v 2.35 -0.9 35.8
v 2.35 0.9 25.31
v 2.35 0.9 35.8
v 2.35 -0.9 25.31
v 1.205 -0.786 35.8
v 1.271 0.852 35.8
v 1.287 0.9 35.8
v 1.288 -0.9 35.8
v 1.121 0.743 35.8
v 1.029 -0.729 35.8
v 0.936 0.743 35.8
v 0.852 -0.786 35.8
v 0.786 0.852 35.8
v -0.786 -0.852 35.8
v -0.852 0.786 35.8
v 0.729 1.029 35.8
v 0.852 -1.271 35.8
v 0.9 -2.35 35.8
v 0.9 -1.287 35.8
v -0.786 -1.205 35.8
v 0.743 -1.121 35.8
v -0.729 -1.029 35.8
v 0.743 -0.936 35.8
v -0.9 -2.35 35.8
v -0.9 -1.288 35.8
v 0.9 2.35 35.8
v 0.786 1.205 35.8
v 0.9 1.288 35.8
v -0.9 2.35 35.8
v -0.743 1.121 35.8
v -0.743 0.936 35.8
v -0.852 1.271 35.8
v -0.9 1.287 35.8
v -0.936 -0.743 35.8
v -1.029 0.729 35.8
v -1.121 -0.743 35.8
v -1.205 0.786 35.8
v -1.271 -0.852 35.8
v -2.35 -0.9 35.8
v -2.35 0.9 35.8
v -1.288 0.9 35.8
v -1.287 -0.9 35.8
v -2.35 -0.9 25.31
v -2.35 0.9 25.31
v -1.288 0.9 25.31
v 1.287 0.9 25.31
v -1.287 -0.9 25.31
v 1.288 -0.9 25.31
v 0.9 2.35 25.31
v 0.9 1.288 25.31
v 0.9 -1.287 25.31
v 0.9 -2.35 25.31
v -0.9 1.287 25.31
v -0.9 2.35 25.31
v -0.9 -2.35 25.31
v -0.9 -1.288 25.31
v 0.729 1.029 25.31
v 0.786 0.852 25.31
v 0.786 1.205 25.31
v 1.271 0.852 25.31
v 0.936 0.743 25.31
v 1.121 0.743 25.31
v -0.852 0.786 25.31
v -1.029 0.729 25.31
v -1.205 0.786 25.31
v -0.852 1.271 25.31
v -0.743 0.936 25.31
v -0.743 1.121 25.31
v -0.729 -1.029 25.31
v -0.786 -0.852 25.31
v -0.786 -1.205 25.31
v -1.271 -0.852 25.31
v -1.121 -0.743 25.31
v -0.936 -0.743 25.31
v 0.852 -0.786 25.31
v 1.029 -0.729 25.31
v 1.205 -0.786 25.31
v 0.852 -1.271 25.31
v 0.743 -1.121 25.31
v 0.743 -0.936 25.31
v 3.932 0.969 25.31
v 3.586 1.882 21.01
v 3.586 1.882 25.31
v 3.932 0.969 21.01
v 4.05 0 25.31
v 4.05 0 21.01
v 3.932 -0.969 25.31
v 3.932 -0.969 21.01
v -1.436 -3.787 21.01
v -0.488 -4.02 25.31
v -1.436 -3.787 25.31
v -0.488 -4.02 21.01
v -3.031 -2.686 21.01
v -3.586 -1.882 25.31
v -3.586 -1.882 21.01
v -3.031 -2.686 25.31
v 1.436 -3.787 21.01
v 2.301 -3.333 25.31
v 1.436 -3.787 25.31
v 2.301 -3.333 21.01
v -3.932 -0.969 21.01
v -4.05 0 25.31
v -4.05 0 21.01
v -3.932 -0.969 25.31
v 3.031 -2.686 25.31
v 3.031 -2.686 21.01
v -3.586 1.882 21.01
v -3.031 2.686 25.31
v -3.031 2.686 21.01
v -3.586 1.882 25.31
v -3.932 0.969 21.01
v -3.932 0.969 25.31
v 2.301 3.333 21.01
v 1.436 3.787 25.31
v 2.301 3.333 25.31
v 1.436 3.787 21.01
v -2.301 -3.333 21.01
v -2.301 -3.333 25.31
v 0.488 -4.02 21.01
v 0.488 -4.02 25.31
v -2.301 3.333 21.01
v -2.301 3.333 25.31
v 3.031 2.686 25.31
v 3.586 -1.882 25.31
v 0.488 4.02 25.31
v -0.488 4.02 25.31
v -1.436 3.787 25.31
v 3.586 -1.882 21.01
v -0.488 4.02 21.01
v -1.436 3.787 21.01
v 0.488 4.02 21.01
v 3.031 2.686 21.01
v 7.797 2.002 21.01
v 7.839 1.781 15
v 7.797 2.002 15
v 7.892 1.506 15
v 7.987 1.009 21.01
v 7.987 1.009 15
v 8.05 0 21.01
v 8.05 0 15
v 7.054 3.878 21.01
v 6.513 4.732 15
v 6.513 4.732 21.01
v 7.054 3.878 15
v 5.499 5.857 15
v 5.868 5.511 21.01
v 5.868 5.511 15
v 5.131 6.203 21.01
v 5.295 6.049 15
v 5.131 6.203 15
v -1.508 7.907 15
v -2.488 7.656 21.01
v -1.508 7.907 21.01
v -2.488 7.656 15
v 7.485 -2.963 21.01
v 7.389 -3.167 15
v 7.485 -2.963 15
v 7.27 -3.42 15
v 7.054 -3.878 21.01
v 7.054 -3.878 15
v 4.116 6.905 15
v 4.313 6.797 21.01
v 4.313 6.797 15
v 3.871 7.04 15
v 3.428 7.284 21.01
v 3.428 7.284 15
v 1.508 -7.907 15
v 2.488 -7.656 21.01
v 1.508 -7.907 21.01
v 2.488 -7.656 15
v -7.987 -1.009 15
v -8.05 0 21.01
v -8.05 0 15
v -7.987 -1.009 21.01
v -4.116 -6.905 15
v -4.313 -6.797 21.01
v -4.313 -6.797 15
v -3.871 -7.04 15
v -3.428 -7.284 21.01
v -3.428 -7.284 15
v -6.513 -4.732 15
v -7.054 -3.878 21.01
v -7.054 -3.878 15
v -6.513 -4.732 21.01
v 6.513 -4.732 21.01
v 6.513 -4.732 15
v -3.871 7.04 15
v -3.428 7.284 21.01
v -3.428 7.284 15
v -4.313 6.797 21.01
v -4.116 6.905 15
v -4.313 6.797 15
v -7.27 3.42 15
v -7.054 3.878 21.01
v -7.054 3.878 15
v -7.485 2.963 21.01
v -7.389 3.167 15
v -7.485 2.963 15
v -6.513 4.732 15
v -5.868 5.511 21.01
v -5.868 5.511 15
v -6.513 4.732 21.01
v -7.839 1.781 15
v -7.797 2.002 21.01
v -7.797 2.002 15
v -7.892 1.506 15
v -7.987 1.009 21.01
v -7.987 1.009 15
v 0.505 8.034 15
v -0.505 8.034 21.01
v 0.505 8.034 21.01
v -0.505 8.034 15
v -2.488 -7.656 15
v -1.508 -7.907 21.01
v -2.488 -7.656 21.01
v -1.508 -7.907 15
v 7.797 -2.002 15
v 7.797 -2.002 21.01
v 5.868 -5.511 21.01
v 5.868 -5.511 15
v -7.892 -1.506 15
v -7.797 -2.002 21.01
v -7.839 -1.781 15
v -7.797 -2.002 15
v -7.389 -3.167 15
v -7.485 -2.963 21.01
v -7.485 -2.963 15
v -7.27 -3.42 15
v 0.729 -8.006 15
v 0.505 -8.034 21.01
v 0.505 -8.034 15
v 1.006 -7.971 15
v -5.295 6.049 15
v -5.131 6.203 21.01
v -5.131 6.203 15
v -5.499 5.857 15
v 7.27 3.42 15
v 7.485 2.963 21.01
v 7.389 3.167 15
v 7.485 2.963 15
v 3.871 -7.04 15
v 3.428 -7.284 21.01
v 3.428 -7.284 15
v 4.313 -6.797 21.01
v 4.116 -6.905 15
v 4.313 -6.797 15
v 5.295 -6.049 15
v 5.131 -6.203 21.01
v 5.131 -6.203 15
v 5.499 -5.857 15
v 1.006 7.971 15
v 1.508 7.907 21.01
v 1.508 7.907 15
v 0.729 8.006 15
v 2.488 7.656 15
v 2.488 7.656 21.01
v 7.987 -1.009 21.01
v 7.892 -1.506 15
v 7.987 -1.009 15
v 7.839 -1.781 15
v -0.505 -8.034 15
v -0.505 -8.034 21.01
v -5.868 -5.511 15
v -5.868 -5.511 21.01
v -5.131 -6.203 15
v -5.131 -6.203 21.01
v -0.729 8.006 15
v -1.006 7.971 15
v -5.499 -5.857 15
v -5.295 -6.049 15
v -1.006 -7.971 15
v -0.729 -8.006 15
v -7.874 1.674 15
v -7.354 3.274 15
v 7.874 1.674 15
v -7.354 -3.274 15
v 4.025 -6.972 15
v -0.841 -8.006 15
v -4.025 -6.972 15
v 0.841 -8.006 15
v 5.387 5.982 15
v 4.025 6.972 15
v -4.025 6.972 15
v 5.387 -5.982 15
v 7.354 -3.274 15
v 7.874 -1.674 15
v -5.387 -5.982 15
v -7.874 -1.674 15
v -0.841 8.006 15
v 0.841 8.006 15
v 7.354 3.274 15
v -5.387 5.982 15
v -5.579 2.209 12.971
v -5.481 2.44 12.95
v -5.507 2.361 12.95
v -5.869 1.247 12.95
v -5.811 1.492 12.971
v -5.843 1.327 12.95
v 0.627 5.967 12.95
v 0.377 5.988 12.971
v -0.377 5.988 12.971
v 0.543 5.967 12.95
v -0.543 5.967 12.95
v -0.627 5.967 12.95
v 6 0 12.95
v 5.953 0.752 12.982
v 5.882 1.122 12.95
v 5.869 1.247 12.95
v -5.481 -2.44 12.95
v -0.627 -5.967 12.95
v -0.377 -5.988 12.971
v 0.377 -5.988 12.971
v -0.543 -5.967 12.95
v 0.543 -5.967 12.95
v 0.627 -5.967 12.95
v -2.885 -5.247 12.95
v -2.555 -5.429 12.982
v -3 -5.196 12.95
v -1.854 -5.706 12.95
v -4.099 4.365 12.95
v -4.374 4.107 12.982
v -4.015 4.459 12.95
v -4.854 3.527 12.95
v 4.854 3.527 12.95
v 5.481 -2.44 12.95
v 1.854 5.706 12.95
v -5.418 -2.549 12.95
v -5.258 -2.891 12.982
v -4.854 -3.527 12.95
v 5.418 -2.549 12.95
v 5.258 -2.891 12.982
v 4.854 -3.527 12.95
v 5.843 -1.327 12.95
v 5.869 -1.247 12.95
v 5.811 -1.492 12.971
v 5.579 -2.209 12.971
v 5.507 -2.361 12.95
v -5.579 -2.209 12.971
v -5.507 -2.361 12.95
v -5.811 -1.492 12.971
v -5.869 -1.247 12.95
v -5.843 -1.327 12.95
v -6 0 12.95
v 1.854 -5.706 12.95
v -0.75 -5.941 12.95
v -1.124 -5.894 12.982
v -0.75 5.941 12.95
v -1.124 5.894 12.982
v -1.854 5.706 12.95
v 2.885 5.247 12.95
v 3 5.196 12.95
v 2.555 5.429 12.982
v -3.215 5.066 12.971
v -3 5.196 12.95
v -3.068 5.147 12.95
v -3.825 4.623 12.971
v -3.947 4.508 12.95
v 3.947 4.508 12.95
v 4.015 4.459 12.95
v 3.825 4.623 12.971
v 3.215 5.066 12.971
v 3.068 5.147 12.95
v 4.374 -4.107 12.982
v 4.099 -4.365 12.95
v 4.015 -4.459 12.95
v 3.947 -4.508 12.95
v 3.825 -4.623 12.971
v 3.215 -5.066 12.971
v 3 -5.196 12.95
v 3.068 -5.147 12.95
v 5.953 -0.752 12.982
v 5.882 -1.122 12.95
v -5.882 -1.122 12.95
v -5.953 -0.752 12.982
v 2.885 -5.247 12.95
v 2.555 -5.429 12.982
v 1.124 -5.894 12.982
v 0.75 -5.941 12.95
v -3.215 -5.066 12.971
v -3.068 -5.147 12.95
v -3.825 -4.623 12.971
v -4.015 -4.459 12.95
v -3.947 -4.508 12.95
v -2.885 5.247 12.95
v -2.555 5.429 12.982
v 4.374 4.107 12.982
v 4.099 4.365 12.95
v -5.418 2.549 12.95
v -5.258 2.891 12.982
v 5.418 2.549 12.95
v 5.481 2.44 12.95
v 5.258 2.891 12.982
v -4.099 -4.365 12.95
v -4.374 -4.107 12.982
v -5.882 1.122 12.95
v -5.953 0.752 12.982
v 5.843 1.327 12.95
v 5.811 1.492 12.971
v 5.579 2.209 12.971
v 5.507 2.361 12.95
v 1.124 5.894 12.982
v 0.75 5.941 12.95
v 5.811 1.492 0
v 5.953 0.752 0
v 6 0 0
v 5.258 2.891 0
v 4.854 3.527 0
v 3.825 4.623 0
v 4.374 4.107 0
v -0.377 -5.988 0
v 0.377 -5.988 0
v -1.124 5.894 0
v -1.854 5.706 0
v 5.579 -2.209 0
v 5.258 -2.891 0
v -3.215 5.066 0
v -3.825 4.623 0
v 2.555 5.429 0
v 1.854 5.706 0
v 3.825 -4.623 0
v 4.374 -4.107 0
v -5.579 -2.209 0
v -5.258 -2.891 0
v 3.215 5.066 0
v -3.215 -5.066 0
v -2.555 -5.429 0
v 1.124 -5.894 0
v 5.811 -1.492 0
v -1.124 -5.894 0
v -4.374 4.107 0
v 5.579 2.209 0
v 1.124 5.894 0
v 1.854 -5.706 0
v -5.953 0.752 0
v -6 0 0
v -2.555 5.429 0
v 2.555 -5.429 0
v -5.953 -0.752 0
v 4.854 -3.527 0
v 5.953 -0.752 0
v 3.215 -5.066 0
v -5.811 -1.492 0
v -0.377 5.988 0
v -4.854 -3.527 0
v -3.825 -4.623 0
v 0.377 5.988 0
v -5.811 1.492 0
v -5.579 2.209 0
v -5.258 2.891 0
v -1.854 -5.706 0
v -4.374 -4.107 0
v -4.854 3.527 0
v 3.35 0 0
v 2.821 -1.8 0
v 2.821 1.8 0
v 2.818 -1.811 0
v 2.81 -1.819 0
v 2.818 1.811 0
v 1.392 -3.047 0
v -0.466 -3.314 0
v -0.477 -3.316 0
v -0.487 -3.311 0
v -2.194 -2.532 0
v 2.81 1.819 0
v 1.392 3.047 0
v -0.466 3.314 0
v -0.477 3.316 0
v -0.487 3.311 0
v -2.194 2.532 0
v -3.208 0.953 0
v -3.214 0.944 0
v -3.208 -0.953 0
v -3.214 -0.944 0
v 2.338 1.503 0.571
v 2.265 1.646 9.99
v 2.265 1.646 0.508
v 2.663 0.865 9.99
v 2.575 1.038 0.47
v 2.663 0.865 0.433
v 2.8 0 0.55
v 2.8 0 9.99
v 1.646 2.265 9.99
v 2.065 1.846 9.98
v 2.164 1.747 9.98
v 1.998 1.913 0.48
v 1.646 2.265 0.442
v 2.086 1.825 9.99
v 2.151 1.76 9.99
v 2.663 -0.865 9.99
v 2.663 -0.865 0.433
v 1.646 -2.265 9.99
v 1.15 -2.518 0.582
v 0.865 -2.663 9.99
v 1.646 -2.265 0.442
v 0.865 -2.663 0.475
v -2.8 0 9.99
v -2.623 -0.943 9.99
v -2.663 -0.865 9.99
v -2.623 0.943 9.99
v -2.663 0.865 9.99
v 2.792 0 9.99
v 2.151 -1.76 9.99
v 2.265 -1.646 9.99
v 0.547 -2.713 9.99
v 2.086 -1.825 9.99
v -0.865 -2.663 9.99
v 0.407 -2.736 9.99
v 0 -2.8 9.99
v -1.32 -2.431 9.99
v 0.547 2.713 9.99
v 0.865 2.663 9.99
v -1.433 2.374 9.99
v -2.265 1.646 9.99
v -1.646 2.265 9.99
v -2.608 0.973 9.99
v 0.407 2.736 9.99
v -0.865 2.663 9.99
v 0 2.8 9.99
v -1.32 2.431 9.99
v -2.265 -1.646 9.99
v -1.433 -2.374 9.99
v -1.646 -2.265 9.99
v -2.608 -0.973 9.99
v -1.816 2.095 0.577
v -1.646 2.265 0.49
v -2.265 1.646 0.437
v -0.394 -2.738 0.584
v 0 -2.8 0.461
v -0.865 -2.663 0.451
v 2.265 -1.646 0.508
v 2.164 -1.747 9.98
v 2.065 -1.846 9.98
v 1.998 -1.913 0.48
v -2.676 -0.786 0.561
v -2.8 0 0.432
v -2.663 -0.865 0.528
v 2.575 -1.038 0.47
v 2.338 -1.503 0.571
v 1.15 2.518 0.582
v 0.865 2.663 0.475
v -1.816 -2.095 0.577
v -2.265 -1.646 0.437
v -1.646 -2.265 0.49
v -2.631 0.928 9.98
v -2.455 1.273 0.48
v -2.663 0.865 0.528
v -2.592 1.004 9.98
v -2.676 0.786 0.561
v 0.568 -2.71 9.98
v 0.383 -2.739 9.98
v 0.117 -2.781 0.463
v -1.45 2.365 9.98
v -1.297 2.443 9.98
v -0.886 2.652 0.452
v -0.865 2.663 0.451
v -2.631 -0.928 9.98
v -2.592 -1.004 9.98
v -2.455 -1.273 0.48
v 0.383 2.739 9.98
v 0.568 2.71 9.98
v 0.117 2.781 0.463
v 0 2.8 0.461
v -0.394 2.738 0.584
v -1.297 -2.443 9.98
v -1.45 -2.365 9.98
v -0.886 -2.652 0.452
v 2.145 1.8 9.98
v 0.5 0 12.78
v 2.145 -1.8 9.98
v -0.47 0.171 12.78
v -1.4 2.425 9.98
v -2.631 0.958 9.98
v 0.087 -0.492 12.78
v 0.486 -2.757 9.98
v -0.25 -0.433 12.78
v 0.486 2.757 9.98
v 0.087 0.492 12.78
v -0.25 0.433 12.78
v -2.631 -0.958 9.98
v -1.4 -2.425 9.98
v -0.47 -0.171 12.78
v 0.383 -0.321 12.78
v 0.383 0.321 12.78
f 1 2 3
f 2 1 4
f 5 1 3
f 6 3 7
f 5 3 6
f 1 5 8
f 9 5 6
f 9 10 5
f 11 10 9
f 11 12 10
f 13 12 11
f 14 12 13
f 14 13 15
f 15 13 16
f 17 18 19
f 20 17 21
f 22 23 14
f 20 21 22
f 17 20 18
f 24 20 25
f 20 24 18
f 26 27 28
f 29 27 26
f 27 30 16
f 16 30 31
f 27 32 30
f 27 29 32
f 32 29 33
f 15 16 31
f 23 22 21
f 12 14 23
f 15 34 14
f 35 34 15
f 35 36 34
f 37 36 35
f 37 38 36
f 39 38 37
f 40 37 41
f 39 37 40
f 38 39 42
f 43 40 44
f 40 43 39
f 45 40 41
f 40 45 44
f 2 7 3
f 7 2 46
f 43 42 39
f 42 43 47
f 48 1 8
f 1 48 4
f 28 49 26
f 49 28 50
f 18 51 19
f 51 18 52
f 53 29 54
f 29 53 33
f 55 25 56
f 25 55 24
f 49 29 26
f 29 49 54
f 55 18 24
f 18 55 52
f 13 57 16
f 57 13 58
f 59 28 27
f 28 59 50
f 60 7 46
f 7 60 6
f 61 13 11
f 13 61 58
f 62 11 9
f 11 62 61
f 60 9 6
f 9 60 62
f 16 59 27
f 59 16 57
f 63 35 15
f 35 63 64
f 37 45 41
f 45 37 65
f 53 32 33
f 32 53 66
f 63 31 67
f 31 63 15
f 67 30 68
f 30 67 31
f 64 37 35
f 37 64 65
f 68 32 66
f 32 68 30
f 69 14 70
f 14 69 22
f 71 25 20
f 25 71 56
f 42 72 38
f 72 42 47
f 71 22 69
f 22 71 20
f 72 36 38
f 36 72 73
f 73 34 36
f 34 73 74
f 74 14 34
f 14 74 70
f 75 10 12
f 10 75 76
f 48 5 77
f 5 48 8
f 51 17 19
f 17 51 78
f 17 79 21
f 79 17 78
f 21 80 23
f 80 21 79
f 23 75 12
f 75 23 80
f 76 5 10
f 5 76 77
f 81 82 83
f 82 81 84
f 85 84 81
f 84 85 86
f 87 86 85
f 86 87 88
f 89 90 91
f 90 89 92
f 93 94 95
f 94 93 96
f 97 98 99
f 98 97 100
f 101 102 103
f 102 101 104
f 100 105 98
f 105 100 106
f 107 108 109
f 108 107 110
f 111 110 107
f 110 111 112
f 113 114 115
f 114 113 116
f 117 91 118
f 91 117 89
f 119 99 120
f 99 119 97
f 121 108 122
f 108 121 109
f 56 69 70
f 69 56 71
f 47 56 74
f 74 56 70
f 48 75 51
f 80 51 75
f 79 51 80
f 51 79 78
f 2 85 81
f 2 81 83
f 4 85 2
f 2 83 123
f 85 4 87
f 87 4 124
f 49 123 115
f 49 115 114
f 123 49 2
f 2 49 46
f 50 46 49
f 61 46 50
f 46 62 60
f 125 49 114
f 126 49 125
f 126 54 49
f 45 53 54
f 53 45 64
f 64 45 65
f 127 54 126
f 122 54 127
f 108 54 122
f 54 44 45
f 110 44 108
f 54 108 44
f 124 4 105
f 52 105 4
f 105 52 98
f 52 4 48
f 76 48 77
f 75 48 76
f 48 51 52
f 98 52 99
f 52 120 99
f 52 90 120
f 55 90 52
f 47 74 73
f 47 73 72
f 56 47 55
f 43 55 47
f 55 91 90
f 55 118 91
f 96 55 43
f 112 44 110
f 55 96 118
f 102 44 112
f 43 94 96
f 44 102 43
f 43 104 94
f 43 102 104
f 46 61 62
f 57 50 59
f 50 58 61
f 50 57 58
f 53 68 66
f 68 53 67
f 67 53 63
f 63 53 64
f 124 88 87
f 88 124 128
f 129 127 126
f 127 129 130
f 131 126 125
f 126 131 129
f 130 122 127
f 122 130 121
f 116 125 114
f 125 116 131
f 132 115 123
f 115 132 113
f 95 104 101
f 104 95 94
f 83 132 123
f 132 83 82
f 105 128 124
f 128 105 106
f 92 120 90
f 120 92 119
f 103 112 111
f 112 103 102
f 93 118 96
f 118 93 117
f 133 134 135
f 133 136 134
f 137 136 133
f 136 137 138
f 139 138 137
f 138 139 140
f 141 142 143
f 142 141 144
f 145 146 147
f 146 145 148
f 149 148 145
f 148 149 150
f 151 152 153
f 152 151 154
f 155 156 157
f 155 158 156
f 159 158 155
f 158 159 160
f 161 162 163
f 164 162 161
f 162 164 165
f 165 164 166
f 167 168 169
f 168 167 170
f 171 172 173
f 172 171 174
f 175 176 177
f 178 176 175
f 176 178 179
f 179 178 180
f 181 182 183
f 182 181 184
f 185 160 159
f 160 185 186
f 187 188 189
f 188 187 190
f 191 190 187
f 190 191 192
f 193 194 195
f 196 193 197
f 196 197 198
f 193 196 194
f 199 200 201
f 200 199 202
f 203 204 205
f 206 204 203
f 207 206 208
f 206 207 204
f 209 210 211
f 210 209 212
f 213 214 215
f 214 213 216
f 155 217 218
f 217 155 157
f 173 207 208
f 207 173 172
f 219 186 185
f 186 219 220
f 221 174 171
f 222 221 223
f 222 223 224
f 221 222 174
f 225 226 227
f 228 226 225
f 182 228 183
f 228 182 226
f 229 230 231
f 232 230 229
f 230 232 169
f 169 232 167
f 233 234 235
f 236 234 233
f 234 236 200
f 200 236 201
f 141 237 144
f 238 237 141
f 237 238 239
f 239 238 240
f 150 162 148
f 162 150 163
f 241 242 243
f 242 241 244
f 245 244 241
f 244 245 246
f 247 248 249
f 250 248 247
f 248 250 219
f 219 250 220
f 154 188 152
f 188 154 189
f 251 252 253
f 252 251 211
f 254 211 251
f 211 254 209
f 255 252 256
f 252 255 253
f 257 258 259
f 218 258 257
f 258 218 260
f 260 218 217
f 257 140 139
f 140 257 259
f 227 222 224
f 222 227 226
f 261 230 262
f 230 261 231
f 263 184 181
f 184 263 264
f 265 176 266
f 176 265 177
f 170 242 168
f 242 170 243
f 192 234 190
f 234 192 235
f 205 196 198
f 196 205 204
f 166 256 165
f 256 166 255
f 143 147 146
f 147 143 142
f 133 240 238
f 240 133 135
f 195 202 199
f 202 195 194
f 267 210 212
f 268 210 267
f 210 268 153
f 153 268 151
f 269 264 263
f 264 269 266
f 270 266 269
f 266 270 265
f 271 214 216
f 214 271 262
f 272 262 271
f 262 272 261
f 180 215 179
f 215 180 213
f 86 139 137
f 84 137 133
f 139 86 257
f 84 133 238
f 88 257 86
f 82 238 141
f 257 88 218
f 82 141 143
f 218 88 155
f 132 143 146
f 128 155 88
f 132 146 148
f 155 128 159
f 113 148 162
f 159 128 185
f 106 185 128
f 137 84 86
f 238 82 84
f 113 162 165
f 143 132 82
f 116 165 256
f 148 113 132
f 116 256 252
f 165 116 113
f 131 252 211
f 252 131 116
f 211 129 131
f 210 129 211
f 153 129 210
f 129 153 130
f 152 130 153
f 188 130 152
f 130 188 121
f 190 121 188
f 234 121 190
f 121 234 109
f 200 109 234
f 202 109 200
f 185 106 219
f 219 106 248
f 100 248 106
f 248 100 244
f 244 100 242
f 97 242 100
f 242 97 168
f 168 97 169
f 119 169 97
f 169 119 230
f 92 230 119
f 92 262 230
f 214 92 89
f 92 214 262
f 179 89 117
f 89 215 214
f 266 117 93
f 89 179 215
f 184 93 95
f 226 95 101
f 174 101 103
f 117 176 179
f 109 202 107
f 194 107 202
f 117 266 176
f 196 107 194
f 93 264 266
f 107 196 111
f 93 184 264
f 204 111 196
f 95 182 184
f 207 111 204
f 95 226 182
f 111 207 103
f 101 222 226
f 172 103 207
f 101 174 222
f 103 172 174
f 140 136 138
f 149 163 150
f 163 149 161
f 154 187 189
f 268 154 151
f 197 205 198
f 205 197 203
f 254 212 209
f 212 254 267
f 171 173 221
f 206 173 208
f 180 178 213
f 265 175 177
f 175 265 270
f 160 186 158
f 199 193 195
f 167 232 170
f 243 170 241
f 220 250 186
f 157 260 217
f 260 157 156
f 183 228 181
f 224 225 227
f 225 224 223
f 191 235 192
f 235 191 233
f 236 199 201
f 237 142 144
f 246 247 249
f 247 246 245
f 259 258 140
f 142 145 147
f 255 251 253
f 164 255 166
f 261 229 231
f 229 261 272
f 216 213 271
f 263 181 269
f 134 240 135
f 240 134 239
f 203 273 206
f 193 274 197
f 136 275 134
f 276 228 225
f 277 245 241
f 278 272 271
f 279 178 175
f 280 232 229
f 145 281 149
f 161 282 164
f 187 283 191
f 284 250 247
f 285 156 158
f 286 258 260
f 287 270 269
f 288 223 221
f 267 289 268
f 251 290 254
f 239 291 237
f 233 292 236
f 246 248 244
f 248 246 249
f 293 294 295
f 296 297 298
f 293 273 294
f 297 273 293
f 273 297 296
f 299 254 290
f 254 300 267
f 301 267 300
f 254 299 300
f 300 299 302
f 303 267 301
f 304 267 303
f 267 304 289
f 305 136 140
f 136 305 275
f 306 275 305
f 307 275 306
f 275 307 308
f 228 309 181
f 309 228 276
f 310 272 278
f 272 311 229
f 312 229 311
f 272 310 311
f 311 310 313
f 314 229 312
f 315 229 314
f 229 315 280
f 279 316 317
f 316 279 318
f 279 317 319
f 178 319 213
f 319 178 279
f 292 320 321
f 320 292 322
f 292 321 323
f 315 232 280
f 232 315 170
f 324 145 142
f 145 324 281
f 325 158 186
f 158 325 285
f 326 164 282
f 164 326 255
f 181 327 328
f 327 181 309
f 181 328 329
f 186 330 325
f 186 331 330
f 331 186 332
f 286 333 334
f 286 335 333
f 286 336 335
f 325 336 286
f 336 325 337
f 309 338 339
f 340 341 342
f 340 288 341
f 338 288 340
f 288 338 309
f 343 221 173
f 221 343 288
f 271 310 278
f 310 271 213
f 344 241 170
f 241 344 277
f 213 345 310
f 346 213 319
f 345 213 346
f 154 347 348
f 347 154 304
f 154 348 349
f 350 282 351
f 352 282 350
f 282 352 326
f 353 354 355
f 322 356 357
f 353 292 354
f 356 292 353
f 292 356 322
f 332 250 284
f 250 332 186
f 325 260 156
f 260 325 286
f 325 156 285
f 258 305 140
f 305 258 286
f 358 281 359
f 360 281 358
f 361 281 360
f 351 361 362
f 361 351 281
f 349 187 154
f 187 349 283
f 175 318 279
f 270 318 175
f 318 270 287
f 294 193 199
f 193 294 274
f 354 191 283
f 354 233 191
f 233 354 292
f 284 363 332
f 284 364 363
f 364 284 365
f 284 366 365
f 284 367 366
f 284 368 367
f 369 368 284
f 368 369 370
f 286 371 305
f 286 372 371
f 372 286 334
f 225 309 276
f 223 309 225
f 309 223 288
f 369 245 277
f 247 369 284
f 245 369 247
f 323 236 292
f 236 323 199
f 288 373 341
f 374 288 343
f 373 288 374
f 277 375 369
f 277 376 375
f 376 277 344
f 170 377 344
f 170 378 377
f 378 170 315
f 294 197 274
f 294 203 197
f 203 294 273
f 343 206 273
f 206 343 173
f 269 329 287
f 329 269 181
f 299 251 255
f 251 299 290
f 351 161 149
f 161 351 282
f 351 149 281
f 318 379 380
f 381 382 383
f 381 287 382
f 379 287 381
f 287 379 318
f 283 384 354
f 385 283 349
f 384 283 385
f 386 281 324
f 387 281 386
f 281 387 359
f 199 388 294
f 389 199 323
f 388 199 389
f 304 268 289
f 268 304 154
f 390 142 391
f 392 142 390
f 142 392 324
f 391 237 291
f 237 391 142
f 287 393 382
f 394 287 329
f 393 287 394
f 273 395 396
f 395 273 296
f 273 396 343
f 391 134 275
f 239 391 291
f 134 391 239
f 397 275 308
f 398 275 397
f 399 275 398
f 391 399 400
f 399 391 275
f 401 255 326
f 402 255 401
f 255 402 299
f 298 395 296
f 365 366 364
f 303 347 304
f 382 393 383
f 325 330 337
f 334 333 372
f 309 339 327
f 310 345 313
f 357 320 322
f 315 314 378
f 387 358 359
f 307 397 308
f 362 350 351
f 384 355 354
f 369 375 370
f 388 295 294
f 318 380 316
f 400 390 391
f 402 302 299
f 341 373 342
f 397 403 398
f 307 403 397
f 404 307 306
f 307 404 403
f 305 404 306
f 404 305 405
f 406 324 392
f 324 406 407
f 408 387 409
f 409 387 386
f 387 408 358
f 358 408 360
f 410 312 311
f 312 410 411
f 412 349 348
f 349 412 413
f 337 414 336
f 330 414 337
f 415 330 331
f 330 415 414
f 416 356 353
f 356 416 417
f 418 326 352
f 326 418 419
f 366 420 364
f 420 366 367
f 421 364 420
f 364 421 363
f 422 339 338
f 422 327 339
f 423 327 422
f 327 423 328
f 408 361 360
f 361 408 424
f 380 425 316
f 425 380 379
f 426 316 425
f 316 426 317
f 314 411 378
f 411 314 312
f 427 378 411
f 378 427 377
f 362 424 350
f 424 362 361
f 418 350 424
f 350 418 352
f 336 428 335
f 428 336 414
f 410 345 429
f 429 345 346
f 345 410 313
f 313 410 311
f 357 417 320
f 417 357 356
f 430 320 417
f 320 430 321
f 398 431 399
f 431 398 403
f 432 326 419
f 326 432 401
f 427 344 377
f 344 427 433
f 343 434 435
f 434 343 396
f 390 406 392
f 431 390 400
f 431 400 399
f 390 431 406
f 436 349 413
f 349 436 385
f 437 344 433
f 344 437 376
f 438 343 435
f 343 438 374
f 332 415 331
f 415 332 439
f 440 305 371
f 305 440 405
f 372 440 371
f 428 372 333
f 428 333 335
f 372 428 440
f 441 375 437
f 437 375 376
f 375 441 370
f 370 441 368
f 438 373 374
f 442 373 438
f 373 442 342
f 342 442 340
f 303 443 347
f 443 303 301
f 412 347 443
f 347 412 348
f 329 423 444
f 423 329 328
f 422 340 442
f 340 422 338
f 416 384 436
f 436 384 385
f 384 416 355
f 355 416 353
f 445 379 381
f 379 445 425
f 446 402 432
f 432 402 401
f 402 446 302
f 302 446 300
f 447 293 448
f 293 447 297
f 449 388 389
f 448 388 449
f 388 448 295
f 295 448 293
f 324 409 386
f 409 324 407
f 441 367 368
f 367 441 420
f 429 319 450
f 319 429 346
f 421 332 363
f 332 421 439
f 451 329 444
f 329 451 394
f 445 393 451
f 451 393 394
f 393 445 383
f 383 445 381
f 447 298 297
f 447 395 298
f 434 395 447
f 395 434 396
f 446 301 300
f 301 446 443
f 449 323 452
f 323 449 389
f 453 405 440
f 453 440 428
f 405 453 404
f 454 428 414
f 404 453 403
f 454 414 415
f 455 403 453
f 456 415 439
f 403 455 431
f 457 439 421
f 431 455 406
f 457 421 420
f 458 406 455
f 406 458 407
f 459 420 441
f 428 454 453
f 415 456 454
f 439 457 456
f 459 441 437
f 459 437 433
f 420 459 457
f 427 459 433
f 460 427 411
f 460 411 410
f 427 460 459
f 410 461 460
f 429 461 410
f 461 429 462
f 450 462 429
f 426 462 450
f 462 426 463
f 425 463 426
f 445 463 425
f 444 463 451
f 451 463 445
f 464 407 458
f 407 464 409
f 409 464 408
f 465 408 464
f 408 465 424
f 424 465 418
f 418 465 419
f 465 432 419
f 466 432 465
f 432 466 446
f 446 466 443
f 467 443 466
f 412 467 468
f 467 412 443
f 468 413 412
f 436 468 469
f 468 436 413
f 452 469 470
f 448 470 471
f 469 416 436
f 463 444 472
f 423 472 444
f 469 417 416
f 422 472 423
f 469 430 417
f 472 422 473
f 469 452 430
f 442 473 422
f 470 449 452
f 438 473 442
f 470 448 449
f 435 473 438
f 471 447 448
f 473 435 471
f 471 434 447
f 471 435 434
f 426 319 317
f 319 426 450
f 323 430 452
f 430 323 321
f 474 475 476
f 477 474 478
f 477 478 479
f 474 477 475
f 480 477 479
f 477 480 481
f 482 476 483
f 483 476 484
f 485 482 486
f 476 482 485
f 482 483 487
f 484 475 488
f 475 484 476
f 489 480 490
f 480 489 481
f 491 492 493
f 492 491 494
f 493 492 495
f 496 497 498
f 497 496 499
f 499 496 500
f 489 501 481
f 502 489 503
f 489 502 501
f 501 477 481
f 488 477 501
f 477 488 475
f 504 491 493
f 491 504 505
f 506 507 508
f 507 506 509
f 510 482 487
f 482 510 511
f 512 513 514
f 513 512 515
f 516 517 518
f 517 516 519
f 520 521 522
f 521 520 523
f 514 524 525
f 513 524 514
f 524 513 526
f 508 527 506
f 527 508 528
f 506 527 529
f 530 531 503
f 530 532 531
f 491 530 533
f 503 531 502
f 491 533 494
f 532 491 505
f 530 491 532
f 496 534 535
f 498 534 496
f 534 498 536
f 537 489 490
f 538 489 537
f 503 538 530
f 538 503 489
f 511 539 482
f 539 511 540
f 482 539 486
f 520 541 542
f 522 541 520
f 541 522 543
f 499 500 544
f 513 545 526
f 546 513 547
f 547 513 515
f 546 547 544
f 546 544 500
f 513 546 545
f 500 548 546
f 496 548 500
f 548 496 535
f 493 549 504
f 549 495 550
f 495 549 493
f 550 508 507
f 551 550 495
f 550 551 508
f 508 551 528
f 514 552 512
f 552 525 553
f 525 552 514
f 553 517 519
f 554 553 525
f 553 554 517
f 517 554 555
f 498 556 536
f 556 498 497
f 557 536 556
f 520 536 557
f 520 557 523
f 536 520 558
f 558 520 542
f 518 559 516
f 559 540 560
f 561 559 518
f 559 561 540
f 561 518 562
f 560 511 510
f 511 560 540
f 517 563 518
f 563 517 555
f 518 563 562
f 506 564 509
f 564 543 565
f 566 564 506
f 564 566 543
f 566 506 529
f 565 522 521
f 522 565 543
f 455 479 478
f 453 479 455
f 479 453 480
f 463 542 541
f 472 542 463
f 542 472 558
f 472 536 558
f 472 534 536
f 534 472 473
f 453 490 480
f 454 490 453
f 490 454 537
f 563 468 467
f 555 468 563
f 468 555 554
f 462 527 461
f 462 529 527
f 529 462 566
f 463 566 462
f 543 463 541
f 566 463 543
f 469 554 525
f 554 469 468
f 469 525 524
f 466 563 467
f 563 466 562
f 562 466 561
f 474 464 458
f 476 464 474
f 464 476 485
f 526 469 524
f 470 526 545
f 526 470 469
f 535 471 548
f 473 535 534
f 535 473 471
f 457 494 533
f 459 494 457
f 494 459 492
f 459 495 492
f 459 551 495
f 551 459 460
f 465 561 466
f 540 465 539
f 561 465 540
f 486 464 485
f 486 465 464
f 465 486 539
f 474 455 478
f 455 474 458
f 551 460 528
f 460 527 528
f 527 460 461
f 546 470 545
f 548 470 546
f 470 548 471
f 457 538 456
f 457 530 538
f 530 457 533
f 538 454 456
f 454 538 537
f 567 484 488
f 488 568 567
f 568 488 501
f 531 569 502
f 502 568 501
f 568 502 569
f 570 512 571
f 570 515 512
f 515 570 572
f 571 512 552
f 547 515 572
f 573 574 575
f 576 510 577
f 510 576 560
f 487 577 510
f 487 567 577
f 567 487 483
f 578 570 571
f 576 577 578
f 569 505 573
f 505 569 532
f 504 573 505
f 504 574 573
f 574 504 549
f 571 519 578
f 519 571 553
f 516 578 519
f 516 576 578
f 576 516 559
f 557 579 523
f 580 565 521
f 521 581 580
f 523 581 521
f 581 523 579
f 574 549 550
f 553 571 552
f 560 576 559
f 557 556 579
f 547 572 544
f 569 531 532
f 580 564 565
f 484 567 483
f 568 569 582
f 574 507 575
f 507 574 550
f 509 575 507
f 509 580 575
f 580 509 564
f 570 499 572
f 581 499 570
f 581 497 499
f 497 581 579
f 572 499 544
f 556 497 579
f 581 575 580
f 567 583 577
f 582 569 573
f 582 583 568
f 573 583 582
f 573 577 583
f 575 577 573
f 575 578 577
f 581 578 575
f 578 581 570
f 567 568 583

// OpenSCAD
// Axle/Hub for Lego wheel.
// Connects M3 motor shaft on Tajima motor/gearbox kit to Lego splined axle wheel.
//
// Printed at 0.2mm layers on UP!. Build 45degree overhangs with no support
//
// Motor shaft hole can be HEX, ROUND, or ROUND with FLAT

// Using metal hex threaded standoff for M3 connection
// standoff is M3x10mm x5mm across flats JAYCAR HP0900
// standoff is press fit into hex hole. Hole has domed ceiling so prints without support
//
// Lego axle design has keyholing to get cleaner inner corners than a simple cross, on the UP
// Has provision for two Flanges that can directly engage the inner surfaces of the wheel rim to provide support
// as the printed axle is prone to shearing under load.
// It is intended that the flange/s are interference fit into the hub parts,
// and that the wheel is forced all the way down the axle to the flange so the axle is not cantilevered
// Intended for insertion from the deep side of the wheel hub

//-------- Dimension Constants ------------
//R???? = radius, L???? = length; Note small numbers added to dimensions are used to trim for exact fit with your printer (eg +0.1)

	LSpline=8.5 + 2; //Spline is the Lego Axle part

	//AQUA  Flange1 closest to spline
	RFlange=(8 +0.1)/2; //Flange1 is adjacent to the axle spline
	LFlange=4.3;

	//TEAL Flange 2 is optional where it needs a large ring spaced off the axle by Flange1

//Type2 Hub - Red/Orange Balloon tyres, double flange; Also works for Black wheels
	RFlange2=(16+0.1)/2;
	LFlange2=6;

// Type1 Hub - Black, flat tyres, only 1 small flange
	//RFlange2=RFlange;
	//LFlange2=0.01;

	HoleOS=0.6/2; // Oversize holes to get to correct size. (UP usually makes holes small)
	HoleIsHex=false;
	HoleFlat=0; //For round motor hole with flat on one side. Depth of flat from outside
     LHole=10        ;  //Hex threaded insert dimensions
     RHole=5/2 + HoleOS; //For hex holes is distance across flats (apothem)

	//MAGENTA  Shaft is part holding hex from motor end
	RShaft =12/2;
     LShaft=LHole+ 5;

	RHex=Apothem2Radius(RHole,6) ; //dimension across diagonals


//-----
function Apothem2Radius(apothem,n) = apothem / cos(180/n);

//use <MCAD/lego_compatibility.scad> //axle shape and dimensions not usable.
use <MCAD/regular_shapes.scad>

//-------------------- Lego Axle ----------------------
axle_spline_width=2.0 - 0.2;
axle_diameter=4.8 - 0.1;
axle_inner_keyhole_radius=0.3; //keyhole the corners to try and make them square when printed

module axle(height) {
	translate([0,0,height/2])
		difference() {
			union() {
				cube([axle_diameter,axle_spline_width,height],center=true);
				cube([axle_spline_width,axle_diameter,height],center=true);
			}//union
			for (A=[0,90,180,270]) {
				rotate([0,0,A]) {
					translate([axle_spline_width/1.75,axle_spline_width/1.75,0])
					cylinder(h=height+0.01,r=axle_inner_keyhole_radius,center=true, $fs=0.2);
				}//rot
			}//for
		}//translate diff
}//module

//----------------------------- Main ---------------------------------
difference() {
	union() { //the solid bits
//color('red") cylinder(r1=RHole*1.25,r2=RHole,h=RHole*0.2);  //entry countersink
		color("magenta") cylinder(h = LShaft, r=RShaft, $fn=50);
		translate([0,0,LShaft]) {
			color("teal") cylinder(h=LFlange2+0.01, r=RFlange2, $fn=50); //Flange2 itself
			if (RFlange2>RShaft)   //make 45 degree cone so no support material is needed
				translate([0,0,-(RFlange2-RShaft)])
					color("teal")  cylinder(h=RFlange2-RShaft, r1=RShaft,r2=RFlange2, $fs=1); //
			translate([0,0,LFlange2]) {
				color("aqua") cylinder(h=LFlange+0.01, r=RFlange, $fs=1);
				translate([0,0,LFlange])
					axle(height=LSpline);
			}
		}
	}//union

	union() { //the holes
		translate([0,0,-0.01]) {
			cylinder(r1=RHole*1.2,r2=RHole*0.8,h=RHole*0.4,center=false);  //entry countersink
			if (HoleIsHex) {
				hexagon_prism(height=LHole,radius=RHex); //hole for hex spacer
			}else{
				intersection() { //to put a flat on side of round shafts
					cylinder(r=RHole,h=LHole,$fn=20);
					translate([-RHole, -RHole - HoleFlat, 0]) cube([2*RHole, 2*RHole,LHole]);
				}//intersect
			}//if
	                        translate([0,0,LHole-0.01])
	                        	cylinder(h=RHole, r1=RHole,r2=0.5    ); //put a cone on top of hole so no support needed
		}
	}//union
} //diff
